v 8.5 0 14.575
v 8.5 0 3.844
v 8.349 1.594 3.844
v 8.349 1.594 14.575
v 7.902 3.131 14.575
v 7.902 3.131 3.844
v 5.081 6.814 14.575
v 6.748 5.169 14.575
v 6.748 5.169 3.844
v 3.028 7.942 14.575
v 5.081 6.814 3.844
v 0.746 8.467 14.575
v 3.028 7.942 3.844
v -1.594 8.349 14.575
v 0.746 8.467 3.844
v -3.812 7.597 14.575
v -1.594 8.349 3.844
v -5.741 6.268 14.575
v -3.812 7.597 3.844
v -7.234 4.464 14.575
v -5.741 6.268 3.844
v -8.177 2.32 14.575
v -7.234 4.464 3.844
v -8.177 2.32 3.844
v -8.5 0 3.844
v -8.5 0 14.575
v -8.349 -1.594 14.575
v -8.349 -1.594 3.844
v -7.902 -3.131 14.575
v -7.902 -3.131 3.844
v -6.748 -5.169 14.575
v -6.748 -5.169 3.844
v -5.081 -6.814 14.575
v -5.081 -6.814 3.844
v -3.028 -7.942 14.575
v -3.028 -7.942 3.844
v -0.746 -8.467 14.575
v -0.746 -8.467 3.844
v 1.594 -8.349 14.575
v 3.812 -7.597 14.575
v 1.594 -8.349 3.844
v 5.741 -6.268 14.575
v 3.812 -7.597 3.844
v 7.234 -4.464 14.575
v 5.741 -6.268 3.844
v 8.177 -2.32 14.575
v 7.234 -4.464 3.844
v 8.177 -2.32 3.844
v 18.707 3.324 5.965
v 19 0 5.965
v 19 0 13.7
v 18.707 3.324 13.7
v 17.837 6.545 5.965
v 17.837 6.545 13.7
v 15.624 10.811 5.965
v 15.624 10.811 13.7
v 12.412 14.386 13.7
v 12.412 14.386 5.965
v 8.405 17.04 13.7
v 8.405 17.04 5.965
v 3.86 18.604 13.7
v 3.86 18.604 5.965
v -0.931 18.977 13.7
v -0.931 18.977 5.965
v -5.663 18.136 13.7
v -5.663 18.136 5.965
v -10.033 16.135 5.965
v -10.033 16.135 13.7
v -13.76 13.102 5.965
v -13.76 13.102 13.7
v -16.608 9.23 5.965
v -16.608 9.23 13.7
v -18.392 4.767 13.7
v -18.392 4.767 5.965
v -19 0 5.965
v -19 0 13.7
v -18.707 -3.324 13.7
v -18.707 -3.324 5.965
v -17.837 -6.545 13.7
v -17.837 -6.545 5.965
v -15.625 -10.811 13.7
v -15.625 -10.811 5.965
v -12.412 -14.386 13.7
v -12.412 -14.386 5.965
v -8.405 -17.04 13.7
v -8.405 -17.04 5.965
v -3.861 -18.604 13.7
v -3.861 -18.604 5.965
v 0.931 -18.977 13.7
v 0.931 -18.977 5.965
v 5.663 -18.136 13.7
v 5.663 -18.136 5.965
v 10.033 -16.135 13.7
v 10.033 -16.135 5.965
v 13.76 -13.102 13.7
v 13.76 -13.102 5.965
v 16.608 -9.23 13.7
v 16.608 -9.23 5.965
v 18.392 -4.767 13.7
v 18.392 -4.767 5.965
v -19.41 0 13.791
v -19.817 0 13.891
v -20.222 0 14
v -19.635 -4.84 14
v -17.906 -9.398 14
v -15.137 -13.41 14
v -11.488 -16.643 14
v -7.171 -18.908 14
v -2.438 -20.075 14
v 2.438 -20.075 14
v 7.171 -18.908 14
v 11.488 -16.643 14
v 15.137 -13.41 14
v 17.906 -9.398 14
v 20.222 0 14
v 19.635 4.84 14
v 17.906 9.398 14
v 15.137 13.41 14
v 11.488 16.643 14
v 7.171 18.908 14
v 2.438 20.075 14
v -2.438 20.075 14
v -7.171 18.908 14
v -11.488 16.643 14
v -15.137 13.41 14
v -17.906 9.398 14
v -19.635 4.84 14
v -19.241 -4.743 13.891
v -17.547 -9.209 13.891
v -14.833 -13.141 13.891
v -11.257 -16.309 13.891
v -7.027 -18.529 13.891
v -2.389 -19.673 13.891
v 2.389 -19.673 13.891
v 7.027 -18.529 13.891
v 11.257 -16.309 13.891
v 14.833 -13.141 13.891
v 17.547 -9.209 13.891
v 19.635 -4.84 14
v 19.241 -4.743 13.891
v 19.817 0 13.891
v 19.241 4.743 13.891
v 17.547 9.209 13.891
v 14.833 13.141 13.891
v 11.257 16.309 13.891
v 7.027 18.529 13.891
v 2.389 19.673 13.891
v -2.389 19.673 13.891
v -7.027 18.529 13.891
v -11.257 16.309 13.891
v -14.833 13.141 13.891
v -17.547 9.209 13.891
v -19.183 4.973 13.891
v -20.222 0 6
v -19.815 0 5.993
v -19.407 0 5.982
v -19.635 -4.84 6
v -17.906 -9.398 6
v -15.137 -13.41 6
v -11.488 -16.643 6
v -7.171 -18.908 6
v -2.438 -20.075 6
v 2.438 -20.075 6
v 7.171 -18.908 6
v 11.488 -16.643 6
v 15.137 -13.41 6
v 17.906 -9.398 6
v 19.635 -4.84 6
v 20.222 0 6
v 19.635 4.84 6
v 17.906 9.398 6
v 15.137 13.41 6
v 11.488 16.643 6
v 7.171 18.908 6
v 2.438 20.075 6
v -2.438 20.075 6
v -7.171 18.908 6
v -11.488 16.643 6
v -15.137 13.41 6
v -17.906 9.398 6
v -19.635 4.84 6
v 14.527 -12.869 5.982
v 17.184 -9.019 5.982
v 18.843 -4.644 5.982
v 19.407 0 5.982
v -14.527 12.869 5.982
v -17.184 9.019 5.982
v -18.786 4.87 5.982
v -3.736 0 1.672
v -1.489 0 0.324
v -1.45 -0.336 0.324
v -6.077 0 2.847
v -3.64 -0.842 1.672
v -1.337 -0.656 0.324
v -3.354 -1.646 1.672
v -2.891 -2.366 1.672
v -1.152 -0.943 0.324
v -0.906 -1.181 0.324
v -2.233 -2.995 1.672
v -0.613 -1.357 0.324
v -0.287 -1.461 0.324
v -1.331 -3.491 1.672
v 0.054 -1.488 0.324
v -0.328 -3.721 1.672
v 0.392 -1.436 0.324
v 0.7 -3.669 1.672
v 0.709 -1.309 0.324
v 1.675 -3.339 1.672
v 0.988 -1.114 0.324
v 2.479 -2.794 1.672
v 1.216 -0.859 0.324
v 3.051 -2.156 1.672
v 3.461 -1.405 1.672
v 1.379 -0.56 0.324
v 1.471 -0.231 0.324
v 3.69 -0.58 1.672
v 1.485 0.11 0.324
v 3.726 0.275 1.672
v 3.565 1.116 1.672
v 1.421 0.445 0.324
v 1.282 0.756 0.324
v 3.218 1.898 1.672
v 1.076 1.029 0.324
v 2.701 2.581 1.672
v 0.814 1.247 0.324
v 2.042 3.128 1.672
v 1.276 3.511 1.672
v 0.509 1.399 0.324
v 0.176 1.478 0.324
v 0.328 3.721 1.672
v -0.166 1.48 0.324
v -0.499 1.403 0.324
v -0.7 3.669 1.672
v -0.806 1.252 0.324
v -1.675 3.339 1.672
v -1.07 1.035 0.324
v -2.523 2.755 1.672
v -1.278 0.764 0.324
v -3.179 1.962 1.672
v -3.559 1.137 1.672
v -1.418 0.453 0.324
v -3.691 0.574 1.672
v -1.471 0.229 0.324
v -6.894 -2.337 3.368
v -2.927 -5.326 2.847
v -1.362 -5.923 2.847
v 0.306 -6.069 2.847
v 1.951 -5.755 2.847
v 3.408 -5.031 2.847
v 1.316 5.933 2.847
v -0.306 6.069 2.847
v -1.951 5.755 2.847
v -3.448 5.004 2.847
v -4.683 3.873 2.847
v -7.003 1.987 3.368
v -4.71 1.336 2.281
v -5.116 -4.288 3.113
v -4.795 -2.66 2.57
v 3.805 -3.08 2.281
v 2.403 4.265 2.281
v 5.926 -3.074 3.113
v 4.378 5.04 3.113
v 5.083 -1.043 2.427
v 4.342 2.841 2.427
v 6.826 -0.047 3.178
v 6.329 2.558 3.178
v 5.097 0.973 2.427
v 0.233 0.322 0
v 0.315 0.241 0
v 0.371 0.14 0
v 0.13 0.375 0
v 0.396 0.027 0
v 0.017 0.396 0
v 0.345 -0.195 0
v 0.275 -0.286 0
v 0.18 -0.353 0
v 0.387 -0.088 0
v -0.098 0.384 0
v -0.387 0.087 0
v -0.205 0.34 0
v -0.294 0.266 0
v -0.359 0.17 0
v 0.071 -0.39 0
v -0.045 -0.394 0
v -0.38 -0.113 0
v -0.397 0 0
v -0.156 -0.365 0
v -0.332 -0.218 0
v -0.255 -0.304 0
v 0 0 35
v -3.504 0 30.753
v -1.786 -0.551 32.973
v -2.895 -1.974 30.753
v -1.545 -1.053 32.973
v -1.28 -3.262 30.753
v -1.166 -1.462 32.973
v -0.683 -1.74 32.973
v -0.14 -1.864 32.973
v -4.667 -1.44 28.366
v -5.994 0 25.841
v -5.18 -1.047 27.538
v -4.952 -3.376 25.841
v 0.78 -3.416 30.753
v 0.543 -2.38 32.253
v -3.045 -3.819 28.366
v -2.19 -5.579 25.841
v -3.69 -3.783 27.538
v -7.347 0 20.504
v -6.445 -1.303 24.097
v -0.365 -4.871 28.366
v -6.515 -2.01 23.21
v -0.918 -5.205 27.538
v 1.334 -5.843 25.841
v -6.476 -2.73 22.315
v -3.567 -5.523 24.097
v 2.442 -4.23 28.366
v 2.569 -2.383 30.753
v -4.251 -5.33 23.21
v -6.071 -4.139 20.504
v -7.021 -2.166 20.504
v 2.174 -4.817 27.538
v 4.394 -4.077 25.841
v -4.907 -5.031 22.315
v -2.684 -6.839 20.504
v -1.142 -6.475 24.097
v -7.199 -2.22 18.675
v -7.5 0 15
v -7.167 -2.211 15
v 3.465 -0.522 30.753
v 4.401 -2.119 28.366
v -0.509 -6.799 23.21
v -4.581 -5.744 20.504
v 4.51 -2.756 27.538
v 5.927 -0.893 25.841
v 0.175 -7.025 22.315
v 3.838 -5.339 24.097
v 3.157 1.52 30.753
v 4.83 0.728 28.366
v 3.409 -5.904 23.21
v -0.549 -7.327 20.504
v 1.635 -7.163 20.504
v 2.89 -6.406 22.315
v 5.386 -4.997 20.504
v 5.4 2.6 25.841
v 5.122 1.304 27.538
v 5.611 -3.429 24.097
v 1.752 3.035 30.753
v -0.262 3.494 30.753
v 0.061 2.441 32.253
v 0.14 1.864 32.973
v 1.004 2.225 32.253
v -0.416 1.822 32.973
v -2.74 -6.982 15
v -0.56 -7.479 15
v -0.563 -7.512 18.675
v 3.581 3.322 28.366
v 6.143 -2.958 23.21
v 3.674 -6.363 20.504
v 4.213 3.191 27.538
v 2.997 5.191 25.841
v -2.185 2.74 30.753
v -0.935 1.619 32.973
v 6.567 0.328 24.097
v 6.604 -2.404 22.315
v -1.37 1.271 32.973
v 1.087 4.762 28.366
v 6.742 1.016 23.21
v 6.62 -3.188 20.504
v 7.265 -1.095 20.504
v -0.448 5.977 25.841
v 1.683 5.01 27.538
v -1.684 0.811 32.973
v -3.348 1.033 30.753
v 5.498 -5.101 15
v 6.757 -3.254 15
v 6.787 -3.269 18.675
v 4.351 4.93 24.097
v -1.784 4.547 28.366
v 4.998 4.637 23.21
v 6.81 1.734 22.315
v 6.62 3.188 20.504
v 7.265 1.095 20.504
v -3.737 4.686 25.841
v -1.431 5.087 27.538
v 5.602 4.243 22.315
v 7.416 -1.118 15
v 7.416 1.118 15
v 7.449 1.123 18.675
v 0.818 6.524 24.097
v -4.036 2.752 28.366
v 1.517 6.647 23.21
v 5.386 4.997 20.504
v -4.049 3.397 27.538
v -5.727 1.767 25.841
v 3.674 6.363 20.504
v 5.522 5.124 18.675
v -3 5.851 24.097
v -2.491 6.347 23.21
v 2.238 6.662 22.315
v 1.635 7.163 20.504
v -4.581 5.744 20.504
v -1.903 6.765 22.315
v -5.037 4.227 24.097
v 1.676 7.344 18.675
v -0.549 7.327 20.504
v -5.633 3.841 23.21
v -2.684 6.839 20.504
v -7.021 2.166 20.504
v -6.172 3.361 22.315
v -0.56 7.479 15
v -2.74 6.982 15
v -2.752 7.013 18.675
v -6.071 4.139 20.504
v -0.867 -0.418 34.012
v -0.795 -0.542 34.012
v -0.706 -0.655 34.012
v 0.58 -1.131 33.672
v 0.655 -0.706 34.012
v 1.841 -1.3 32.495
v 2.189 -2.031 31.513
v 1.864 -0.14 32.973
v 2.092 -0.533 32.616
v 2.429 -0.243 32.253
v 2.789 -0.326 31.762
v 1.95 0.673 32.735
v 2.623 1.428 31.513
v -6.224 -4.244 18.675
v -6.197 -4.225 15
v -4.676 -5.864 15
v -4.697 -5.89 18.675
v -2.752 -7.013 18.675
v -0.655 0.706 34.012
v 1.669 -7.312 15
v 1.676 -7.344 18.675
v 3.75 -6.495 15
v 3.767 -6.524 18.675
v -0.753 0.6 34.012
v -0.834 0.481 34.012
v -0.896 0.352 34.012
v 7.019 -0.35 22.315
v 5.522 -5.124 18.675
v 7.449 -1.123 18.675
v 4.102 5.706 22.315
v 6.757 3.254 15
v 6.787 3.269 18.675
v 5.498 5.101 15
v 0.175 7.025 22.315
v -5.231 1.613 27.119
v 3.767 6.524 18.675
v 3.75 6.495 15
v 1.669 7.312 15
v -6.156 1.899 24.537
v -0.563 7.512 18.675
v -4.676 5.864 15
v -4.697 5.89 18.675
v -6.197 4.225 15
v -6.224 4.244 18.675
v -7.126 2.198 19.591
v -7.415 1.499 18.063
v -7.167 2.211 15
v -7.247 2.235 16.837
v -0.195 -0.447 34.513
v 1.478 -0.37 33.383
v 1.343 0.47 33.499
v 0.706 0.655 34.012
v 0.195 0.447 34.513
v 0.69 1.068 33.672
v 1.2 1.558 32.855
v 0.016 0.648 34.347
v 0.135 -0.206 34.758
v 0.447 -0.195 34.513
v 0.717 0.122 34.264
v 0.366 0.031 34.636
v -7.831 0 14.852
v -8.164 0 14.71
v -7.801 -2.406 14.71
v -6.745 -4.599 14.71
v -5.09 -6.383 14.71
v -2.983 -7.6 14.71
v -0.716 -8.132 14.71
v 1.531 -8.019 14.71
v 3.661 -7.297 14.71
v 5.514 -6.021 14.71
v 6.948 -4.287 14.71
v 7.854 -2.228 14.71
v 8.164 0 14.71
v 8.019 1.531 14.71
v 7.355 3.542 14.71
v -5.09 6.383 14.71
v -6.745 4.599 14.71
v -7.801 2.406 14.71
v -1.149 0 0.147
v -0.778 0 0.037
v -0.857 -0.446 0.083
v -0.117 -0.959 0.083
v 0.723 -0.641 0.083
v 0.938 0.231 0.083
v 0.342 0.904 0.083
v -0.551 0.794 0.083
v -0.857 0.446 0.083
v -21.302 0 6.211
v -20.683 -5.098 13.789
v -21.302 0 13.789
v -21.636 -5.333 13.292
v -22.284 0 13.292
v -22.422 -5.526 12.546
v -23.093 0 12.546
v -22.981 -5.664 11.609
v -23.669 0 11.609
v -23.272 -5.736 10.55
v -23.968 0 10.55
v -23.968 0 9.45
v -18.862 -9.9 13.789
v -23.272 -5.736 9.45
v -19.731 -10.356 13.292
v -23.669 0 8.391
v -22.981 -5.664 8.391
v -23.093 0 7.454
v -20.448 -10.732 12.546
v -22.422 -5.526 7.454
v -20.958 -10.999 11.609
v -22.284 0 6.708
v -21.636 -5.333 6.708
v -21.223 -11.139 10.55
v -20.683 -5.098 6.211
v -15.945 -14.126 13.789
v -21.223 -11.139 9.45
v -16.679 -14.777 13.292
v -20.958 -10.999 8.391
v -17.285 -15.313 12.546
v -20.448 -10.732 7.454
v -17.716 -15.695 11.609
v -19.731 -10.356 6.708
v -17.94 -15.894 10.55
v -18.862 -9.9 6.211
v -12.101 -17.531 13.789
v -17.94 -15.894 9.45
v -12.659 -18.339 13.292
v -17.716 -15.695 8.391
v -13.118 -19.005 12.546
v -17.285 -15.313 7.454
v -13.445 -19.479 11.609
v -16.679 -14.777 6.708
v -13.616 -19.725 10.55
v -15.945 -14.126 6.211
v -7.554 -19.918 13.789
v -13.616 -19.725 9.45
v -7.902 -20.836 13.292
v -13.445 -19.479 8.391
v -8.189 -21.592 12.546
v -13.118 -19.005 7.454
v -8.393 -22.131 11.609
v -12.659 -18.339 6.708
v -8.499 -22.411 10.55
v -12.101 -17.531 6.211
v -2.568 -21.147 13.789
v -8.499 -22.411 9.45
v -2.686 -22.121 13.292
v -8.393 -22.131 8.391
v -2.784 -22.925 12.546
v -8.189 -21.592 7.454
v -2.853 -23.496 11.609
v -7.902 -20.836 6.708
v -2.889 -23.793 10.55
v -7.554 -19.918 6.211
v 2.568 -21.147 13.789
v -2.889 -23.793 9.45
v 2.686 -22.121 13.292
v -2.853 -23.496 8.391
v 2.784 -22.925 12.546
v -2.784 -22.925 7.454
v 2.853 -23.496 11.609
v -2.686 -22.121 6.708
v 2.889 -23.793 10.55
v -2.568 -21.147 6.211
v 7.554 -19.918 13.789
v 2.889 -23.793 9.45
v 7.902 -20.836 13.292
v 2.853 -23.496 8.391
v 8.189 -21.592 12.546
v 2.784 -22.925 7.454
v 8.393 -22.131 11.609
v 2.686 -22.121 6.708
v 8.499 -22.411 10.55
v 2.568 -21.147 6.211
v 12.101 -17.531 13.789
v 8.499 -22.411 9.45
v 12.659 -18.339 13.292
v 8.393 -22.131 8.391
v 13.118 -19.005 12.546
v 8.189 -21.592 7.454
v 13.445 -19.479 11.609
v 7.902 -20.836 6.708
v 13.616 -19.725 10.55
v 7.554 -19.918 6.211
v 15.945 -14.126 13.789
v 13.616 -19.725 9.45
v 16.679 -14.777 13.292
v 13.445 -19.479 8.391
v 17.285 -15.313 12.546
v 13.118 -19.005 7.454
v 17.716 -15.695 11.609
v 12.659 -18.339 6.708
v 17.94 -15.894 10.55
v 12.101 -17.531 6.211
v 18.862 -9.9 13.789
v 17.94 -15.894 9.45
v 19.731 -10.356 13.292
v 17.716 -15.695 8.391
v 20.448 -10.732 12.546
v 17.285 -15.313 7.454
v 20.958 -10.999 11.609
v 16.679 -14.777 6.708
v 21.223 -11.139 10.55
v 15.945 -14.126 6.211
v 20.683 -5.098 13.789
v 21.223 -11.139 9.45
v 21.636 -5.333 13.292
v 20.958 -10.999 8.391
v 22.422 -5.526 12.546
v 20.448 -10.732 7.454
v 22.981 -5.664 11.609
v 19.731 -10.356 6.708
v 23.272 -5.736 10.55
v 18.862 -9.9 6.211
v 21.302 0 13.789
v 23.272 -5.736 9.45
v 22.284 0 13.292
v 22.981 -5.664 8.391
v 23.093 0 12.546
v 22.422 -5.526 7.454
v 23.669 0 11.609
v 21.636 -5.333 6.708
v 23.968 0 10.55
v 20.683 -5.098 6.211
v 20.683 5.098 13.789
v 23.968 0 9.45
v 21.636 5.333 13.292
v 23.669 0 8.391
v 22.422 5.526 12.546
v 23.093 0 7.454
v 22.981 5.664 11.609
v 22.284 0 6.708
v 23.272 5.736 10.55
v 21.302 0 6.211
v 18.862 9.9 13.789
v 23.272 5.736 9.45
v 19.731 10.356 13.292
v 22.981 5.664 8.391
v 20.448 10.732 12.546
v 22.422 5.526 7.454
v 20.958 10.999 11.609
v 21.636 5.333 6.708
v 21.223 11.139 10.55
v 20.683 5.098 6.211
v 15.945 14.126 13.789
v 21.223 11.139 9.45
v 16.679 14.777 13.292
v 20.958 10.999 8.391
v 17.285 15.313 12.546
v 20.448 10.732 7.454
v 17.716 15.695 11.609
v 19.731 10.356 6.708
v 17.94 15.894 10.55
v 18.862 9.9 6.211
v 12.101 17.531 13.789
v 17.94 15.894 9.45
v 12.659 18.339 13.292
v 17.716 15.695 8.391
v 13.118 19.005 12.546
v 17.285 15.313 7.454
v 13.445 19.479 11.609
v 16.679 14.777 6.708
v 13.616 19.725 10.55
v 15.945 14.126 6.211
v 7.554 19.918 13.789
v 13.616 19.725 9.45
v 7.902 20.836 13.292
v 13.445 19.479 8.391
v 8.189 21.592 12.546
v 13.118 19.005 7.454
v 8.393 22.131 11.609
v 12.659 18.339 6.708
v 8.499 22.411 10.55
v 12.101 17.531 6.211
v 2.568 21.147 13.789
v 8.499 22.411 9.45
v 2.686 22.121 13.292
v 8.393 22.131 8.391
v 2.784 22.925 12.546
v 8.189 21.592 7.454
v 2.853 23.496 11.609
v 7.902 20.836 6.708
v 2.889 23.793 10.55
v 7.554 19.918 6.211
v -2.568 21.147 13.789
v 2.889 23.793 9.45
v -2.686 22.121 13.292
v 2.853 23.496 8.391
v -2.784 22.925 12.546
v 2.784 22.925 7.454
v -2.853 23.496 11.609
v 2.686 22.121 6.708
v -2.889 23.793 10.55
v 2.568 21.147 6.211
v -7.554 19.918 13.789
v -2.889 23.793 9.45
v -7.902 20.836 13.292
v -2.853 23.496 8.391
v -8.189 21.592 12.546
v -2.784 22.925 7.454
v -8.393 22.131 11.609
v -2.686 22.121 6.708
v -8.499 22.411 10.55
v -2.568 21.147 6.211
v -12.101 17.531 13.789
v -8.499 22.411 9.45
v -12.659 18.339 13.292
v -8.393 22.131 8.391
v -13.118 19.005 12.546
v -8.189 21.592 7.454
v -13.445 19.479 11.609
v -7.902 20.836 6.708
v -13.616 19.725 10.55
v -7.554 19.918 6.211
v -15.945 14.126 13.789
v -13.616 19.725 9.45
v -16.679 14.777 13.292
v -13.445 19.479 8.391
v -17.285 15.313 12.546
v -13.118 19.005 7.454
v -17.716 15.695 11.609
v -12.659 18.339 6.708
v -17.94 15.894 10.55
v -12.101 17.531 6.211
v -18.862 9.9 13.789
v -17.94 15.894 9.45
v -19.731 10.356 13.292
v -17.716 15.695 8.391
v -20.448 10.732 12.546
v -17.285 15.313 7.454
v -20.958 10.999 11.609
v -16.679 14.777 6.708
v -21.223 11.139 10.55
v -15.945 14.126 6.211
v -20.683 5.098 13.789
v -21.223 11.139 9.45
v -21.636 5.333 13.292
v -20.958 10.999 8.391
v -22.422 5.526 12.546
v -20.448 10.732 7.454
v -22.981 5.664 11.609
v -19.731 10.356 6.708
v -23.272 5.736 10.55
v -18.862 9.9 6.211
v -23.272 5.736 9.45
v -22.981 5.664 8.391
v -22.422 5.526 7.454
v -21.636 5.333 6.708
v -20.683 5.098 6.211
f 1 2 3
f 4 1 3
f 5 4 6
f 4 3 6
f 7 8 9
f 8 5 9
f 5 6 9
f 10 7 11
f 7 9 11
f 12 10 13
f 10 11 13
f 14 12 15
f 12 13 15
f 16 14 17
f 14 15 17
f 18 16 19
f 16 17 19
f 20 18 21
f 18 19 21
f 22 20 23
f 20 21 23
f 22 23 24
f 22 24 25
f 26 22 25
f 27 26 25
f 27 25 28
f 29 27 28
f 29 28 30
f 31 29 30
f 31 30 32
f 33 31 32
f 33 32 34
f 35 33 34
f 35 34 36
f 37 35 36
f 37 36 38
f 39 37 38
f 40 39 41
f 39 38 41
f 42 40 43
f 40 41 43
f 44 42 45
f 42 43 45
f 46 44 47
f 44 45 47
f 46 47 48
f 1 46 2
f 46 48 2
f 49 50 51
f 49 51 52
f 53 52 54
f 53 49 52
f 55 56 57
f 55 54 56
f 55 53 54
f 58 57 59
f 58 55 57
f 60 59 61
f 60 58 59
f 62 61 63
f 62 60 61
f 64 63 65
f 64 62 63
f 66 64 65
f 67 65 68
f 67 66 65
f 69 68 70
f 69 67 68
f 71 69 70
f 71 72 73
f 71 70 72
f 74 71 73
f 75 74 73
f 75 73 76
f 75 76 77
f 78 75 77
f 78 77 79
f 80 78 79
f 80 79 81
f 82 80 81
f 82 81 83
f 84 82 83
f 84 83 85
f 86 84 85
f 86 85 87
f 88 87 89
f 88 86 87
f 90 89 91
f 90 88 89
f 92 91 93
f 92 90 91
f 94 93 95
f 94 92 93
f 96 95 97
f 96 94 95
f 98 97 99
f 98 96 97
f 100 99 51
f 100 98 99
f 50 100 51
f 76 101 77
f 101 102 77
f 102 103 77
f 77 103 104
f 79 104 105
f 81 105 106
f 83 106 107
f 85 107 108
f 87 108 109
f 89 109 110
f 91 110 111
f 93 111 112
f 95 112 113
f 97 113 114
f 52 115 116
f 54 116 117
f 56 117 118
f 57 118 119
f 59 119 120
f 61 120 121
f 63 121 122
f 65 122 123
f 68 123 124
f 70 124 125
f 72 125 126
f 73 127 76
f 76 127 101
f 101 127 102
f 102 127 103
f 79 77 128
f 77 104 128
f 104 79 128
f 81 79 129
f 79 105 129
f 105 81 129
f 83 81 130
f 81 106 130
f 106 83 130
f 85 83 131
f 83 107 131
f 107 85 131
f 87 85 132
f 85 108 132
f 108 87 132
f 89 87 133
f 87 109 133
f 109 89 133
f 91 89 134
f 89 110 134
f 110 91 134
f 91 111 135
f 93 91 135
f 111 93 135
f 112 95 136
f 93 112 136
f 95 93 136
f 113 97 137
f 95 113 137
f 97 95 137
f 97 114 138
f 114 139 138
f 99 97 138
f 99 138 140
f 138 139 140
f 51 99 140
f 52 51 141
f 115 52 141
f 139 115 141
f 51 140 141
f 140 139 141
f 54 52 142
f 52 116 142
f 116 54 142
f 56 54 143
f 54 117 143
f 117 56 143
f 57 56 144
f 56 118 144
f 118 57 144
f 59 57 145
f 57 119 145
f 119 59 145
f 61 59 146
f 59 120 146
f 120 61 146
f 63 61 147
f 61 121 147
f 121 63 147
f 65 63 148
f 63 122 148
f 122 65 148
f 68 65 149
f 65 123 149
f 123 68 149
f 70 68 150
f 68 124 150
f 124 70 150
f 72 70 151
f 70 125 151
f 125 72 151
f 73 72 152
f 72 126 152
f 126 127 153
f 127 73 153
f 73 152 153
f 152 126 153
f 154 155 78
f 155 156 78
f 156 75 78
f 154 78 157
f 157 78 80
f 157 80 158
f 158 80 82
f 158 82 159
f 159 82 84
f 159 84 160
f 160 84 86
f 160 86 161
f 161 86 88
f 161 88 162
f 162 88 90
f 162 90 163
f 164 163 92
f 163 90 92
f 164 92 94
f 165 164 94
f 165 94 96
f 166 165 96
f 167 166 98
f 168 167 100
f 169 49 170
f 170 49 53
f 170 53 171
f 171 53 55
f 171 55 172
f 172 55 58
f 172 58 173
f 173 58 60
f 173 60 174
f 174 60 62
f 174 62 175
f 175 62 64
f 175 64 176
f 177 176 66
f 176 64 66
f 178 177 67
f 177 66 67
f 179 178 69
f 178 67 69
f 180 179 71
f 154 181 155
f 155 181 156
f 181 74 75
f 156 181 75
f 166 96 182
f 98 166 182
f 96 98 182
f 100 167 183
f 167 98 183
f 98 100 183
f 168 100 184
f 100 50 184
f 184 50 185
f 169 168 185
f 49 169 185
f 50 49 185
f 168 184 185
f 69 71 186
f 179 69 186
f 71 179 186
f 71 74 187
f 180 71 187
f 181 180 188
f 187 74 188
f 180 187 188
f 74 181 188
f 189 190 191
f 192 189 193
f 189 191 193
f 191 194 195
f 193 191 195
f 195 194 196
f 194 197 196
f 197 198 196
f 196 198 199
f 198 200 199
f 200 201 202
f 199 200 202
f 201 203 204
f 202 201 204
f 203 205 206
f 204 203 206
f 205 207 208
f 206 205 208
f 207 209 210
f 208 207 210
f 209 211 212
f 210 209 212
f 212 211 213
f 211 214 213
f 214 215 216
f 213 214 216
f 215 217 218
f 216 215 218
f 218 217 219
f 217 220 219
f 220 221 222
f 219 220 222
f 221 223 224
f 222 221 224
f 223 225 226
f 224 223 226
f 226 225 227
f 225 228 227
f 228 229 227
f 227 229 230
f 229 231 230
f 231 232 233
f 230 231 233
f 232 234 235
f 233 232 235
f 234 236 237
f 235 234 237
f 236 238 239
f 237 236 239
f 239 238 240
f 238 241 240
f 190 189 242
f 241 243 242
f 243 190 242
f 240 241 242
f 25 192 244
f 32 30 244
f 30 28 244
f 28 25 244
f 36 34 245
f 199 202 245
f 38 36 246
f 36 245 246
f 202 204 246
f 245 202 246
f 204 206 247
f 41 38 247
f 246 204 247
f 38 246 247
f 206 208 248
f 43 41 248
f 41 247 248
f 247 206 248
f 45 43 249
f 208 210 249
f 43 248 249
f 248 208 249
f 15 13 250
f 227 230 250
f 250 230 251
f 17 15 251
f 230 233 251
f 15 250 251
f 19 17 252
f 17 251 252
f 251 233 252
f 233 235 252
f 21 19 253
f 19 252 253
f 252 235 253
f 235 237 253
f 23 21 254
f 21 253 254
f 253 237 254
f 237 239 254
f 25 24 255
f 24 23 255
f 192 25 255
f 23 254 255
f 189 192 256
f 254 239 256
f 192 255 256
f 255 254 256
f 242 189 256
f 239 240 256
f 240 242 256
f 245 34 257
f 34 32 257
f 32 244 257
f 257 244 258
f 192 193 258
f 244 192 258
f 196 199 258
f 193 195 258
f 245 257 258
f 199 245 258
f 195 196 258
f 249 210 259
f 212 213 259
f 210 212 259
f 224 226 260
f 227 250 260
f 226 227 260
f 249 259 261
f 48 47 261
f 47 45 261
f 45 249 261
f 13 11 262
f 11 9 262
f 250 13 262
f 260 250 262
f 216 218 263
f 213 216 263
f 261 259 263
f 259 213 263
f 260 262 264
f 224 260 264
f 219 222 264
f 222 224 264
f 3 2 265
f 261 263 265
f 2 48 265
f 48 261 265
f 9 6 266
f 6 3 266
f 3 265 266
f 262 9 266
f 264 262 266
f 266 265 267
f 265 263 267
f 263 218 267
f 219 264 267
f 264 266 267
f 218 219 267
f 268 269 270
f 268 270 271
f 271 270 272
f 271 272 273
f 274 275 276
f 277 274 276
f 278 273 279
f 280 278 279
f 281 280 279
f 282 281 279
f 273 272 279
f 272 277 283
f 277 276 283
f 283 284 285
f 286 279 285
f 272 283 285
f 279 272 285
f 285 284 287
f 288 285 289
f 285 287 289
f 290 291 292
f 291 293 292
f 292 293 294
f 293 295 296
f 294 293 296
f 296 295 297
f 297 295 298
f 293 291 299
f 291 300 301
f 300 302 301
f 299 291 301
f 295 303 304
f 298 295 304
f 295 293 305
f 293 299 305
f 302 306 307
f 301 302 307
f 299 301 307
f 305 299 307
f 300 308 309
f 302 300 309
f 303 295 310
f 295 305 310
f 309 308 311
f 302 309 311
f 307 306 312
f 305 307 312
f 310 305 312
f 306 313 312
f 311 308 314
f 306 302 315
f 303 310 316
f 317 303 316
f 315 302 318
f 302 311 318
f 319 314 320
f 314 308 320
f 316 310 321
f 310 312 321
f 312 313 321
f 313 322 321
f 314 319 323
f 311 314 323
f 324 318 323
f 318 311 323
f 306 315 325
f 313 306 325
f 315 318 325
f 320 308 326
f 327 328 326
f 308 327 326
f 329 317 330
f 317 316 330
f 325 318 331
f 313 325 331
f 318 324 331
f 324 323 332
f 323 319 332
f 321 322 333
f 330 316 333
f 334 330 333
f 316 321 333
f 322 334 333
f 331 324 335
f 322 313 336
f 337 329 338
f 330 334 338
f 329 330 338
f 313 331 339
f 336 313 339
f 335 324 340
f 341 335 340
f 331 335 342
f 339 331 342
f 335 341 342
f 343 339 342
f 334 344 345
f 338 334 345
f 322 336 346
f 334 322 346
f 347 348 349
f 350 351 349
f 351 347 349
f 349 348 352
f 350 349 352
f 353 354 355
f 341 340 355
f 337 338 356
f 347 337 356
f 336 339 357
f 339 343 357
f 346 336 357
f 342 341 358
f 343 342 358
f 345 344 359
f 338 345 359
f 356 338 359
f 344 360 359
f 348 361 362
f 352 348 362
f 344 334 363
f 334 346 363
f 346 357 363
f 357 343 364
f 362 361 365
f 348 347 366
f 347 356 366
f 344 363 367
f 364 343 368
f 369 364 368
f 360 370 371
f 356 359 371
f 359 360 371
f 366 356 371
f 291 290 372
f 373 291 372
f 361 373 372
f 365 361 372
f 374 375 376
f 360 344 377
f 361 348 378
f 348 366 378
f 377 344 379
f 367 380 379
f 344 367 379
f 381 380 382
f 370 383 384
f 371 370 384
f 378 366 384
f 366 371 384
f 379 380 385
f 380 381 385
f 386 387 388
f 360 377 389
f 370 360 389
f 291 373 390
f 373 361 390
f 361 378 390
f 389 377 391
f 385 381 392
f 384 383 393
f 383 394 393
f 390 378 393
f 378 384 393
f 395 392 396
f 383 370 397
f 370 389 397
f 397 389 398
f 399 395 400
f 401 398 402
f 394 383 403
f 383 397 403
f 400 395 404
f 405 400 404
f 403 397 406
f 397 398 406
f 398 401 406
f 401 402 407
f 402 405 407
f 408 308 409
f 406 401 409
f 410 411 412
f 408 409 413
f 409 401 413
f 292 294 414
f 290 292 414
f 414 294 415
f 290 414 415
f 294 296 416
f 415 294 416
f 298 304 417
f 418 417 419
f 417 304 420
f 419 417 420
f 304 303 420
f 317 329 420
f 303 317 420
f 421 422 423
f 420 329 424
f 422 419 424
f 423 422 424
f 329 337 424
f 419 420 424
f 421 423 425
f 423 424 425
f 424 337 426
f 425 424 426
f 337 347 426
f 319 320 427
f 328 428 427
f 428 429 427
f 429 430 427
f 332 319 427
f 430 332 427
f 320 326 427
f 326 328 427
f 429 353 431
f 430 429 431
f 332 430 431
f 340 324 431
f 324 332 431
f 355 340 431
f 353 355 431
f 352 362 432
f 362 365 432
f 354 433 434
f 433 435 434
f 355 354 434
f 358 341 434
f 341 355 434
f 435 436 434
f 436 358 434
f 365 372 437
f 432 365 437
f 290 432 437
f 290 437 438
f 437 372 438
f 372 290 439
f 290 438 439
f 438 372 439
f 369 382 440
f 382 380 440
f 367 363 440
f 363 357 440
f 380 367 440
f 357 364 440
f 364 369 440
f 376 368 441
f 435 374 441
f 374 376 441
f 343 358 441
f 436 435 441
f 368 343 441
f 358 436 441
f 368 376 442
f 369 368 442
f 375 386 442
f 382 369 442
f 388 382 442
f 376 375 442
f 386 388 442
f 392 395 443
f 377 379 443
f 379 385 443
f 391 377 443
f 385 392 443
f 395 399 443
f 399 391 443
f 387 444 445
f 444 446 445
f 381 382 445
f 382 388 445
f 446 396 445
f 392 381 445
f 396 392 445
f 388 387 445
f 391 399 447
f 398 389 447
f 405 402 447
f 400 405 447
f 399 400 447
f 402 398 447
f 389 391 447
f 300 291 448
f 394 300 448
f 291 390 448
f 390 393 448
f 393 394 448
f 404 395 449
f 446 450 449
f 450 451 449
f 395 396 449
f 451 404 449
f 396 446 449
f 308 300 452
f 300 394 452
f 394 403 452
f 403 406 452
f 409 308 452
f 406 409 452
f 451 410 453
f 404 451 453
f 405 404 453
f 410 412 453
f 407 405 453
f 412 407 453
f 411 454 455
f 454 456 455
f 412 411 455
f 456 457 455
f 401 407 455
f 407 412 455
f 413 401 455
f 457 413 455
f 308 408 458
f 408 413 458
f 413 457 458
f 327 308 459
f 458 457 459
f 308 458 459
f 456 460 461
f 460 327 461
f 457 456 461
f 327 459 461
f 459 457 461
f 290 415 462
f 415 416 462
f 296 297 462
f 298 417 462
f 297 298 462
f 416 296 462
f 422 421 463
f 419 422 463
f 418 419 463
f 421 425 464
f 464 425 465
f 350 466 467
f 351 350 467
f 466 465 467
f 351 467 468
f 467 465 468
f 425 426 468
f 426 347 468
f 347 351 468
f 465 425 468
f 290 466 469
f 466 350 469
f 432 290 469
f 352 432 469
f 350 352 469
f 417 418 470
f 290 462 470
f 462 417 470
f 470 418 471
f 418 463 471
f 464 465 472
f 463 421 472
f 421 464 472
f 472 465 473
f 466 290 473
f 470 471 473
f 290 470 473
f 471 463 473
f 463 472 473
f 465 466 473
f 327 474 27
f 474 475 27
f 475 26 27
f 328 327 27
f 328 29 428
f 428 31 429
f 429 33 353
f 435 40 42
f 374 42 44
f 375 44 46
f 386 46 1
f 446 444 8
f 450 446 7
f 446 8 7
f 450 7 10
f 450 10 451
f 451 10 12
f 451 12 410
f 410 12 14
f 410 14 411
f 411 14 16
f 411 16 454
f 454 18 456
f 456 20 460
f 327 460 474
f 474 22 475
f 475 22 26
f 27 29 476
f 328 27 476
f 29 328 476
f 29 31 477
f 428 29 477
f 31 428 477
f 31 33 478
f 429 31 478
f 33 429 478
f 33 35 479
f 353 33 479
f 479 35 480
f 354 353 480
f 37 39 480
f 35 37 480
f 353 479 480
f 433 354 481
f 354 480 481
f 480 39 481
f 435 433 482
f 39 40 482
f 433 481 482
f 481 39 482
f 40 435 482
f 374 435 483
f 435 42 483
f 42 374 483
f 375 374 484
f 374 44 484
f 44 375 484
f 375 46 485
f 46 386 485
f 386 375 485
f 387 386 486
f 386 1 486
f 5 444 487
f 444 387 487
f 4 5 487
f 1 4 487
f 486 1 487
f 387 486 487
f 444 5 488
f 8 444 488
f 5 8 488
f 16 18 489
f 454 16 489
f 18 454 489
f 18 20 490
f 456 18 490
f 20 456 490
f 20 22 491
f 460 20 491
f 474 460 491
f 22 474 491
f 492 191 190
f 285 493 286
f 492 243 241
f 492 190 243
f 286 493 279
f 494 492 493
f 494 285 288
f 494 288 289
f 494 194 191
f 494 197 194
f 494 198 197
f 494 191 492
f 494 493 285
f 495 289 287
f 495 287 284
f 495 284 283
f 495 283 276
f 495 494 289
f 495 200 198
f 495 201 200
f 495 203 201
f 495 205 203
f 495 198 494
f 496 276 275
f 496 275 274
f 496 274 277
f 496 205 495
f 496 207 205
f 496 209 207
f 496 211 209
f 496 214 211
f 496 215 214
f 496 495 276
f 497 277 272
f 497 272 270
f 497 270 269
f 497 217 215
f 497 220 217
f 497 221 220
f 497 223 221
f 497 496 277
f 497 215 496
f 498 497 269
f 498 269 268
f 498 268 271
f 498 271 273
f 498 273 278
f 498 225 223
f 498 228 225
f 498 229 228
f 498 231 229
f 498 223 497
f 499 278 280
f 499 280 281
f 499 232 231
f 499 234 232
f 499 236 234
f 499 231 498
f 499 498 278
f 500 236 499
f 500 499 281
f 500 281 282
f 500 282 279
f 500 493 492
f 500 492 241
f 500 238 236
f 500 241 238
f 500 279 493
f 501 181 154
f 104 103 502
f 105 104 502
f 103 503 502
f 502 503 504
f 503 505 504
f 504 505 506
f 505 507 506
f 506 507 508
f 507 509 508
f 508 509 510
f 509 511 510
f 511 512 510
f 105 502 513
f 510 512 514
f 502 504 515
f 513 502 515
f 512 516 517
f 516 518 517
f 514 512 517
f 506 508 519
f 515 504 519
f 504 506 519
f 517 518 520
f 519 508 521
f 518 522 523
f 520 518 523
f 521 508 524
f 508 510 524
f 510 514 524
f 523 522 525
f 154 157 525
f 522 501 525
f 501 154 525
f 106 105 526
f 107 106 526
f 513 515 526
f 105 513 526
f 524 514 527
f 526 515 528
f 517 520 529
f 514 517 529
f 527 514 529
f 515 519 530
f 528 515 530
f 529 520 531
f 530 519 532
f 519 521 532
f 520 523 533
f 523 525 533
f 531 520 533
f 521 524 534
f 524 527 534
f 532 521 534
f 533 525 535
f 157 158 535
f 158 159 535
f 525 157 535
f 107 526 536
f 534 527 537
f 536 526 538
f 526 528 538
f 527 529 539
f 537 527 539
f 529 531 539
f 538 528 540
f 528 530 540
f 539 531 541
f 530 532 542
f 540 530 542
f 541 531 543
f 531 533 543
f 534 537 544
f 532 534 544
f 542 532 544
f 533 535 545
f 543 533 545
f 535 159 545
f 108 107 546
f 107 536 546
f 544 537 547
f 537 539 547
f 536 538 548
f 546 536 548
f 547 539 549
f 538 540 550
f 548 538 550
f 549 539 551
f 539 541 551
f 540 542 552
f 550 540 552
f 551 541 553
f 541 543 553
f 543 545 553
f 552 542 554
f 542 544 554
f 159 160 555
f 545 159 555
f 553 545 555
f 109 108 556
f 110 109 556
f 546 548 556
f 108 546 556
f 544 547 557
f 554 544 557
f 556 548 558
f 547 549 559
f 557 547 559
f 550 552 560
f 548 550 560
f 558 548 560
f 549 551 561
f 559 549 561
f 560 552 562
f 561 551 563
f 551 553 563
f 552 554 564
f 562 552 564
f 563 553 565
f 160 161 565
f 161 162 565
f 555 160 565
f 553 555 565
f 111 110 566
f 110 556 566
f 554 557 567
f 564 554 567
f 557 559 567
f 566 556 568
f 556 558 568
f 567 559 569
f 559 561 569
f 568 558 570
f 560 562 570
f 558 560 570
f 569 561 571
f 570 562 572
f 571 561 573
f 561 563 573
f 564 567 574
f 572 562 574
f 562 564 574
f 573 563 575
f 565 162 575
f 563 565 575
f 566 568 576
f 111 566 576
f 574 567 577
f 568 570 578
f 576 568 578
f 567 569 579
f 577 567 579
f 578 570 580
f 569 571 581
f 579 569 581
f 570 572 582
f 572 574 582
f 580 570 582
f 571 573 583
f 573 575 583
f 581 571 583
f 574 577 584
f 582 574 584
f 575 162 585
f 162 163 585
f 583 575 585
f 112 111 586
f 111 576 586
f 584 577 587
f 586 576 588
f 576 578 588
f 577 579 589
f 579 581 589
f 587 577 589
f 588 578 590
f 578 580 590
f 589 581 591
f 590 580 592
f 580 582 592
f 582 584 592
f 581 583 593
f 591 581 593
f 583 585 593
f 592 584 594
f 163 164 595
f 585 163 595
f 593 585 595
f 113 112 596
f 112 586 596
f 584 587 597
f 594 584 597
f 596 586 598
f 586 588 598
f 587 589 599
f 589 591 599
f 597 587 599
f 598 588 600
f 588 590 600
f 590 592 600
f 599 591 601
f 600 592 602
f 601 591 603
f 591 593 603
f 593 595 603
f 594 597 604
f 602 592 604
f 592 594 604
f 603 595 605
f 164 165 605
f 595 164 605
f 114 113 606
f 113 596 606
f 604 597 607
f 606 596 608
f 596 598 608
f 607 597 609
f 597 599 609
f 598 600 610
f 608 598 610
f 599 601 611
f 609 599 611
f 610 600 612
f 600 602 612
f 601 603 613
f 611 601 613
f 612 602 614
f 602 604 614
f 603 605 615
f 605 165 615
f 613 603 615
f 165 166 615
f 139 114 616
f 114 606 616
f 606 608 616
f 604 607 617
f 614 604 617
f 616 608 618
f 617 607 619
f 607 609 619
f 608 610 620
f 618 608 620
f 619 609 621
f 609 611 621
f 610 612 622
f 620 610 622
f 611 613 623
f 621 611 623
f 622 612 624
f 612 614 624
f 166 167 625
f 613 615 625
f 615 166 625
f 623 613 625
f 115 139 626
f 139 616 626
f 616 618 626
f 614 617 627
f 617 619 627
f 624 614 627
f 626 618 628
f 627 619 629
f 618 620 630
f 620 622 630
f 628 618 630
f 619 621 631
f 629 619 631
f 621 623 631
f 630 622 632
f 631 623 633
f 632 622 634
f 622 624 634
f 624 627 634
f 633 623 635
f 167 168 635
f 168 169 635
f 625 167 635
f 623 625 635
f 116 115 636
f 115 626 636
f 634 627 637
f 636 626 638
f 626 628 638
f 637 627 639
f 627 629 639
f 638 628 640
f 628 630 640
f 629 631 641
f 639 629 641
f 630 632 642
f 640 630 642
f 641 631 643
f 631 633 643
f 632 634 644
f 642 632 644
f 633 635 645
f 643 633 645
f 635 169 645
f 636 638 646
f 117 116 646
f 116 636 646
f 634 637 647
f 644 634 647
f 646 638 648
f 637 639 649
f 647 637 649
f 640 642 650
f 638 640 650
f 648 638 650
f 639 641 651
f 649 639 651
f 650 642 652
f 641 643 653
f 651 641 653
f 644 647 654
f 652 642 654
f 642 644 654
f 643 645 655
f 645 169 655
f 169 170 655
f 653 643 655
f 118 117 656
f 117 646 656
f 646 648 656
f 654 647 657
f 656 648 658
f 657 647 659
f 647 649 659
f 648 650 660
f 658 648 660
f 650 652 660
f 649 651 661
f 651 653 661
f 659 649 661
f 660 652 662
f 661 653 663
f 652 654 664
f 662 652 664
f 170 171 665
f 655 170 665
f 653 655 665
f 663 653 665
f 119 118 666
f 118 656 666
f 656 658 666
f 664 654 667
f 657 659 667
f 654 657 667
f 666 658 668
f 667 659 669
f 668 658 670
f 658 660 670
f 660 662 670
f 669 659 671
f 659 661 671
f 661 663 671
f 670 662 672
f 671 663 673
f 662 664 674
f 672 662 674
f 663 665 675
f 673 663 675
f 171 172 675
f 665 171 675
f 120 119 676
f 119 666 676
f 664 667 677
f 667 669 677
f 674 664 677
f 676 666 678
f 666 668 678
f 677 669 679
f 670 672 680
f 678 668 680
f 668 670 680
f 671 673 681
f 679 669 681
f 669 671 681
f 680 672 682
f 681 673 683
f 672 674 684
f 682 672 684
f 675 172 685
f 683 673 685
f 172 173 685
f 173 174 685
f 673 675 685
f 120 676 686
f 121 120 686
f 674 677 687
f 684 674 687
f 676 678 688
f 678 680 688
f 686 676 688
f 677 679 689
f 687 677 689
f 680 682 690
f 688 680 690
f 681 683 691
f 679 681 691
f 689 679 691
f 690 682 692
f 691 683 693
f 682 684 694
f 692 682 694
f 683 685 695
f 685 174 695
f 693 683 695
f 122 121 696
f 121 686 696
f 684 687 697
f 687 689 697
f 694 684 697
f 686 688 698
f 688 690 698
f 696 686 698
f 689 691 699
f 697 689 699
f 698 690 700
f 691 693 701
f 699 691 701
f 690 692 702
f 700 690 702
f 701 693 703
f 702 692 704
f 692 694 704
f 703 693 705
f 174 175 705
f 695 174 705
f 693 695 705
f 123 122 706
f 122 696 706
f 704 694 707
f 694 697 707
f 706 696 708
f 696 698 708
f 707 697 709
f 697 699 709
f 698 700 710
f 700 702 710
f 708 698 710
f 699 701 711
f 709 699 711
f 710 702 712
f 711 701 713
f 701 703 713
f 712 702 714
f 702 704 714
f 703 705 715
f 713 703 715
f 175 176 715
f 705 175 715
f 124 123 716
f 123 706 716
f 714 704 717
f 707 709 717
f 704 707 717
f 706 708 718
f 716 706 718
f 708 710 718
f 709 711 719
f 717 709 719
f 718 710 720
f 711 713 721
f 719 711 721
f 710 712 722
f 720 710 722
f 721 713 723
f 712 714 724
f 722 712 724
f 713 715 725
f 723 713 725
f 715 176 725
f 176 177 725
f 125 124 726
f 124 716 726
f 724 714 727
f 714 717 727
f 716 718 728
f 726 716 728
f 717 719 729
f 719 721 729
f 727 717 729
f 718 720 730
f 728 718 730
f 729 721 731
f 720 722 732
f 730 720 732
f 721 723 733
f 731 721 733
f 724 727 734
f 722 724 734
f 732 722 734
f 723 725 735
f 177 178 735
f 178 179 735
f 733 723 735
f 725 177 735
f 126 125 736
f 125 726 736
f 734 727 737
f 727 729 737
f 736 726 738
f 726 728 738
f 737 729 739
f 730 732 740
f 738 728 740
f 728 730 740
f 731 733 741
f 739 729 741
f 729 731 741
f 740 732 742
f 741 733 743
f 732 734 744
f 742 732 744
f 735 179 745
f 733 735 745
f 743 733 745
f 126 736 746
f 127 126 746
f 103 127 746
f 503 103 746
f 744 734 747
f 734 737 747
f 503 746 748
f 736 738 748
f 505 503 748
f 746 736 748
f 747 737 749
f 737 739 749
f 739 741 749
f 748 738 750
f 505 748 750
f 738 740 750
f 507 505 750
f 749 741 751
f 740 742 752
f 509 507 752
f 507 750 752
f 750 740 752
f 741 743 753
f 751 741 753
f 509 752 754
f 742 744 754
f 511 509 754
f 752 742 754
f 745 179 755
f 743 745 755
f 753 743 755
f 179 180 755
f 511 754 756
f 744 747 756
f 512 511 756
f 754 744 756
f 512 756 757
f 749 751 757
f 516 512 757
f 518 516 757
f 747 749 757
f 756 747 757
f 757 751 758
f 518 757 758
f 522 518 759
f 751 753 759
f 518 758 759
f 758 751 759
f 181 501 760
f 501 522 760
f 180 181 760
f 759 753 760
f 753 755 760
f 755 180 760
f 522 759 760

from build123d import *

# Parameters (mm, degrees)
F3_R     = 2
F4_R     = 19
F4_R_2   = 8.5
F5_DEPTH = 25


with BuildPart() as f2:
    # F0 (on Front) → F2 (revolve)
    with BuildSketch(Plane.XZ):
        with BuildLine():
            Line((0, 0), (0, 35))
            ThreePointArc((0, 35), (-5.993513, 25.841318), (-7.5, 15))
            ThreePointArc((-7.5, 15), (-13.771963, 13.365488), (-20.222276, 14))
            ThreePointArc((-20.222276, 14), (-24.006171, 10), (-20.222276, 6))
            ThreePointArc((-20.222276, 6), (-10.170315, 4.412269), (-1, 0))
            Line((-1, 0), (0, 0))
        make_face()
    revolve(axis=Axis((0, 0, 21.044377), (0, 0, 1)))

    # F3
    f3_edges = [f2.edges().sort_by_distance(p)[0] for p in [
        (1, 0, 0),
    ]]
    fillet(f3_edges, radius=F3_R)

    # F4 (on Top) → F5 (cut)
    with BuildSketch(Plane.XY):
        Circle(F4_R)
        Circle(F4_R_2, mode=Mode.SUBTRACT)
    extrude(amount=F5_DEPTH, mode=Mode.SUBTRACT)


solid = f2.part
